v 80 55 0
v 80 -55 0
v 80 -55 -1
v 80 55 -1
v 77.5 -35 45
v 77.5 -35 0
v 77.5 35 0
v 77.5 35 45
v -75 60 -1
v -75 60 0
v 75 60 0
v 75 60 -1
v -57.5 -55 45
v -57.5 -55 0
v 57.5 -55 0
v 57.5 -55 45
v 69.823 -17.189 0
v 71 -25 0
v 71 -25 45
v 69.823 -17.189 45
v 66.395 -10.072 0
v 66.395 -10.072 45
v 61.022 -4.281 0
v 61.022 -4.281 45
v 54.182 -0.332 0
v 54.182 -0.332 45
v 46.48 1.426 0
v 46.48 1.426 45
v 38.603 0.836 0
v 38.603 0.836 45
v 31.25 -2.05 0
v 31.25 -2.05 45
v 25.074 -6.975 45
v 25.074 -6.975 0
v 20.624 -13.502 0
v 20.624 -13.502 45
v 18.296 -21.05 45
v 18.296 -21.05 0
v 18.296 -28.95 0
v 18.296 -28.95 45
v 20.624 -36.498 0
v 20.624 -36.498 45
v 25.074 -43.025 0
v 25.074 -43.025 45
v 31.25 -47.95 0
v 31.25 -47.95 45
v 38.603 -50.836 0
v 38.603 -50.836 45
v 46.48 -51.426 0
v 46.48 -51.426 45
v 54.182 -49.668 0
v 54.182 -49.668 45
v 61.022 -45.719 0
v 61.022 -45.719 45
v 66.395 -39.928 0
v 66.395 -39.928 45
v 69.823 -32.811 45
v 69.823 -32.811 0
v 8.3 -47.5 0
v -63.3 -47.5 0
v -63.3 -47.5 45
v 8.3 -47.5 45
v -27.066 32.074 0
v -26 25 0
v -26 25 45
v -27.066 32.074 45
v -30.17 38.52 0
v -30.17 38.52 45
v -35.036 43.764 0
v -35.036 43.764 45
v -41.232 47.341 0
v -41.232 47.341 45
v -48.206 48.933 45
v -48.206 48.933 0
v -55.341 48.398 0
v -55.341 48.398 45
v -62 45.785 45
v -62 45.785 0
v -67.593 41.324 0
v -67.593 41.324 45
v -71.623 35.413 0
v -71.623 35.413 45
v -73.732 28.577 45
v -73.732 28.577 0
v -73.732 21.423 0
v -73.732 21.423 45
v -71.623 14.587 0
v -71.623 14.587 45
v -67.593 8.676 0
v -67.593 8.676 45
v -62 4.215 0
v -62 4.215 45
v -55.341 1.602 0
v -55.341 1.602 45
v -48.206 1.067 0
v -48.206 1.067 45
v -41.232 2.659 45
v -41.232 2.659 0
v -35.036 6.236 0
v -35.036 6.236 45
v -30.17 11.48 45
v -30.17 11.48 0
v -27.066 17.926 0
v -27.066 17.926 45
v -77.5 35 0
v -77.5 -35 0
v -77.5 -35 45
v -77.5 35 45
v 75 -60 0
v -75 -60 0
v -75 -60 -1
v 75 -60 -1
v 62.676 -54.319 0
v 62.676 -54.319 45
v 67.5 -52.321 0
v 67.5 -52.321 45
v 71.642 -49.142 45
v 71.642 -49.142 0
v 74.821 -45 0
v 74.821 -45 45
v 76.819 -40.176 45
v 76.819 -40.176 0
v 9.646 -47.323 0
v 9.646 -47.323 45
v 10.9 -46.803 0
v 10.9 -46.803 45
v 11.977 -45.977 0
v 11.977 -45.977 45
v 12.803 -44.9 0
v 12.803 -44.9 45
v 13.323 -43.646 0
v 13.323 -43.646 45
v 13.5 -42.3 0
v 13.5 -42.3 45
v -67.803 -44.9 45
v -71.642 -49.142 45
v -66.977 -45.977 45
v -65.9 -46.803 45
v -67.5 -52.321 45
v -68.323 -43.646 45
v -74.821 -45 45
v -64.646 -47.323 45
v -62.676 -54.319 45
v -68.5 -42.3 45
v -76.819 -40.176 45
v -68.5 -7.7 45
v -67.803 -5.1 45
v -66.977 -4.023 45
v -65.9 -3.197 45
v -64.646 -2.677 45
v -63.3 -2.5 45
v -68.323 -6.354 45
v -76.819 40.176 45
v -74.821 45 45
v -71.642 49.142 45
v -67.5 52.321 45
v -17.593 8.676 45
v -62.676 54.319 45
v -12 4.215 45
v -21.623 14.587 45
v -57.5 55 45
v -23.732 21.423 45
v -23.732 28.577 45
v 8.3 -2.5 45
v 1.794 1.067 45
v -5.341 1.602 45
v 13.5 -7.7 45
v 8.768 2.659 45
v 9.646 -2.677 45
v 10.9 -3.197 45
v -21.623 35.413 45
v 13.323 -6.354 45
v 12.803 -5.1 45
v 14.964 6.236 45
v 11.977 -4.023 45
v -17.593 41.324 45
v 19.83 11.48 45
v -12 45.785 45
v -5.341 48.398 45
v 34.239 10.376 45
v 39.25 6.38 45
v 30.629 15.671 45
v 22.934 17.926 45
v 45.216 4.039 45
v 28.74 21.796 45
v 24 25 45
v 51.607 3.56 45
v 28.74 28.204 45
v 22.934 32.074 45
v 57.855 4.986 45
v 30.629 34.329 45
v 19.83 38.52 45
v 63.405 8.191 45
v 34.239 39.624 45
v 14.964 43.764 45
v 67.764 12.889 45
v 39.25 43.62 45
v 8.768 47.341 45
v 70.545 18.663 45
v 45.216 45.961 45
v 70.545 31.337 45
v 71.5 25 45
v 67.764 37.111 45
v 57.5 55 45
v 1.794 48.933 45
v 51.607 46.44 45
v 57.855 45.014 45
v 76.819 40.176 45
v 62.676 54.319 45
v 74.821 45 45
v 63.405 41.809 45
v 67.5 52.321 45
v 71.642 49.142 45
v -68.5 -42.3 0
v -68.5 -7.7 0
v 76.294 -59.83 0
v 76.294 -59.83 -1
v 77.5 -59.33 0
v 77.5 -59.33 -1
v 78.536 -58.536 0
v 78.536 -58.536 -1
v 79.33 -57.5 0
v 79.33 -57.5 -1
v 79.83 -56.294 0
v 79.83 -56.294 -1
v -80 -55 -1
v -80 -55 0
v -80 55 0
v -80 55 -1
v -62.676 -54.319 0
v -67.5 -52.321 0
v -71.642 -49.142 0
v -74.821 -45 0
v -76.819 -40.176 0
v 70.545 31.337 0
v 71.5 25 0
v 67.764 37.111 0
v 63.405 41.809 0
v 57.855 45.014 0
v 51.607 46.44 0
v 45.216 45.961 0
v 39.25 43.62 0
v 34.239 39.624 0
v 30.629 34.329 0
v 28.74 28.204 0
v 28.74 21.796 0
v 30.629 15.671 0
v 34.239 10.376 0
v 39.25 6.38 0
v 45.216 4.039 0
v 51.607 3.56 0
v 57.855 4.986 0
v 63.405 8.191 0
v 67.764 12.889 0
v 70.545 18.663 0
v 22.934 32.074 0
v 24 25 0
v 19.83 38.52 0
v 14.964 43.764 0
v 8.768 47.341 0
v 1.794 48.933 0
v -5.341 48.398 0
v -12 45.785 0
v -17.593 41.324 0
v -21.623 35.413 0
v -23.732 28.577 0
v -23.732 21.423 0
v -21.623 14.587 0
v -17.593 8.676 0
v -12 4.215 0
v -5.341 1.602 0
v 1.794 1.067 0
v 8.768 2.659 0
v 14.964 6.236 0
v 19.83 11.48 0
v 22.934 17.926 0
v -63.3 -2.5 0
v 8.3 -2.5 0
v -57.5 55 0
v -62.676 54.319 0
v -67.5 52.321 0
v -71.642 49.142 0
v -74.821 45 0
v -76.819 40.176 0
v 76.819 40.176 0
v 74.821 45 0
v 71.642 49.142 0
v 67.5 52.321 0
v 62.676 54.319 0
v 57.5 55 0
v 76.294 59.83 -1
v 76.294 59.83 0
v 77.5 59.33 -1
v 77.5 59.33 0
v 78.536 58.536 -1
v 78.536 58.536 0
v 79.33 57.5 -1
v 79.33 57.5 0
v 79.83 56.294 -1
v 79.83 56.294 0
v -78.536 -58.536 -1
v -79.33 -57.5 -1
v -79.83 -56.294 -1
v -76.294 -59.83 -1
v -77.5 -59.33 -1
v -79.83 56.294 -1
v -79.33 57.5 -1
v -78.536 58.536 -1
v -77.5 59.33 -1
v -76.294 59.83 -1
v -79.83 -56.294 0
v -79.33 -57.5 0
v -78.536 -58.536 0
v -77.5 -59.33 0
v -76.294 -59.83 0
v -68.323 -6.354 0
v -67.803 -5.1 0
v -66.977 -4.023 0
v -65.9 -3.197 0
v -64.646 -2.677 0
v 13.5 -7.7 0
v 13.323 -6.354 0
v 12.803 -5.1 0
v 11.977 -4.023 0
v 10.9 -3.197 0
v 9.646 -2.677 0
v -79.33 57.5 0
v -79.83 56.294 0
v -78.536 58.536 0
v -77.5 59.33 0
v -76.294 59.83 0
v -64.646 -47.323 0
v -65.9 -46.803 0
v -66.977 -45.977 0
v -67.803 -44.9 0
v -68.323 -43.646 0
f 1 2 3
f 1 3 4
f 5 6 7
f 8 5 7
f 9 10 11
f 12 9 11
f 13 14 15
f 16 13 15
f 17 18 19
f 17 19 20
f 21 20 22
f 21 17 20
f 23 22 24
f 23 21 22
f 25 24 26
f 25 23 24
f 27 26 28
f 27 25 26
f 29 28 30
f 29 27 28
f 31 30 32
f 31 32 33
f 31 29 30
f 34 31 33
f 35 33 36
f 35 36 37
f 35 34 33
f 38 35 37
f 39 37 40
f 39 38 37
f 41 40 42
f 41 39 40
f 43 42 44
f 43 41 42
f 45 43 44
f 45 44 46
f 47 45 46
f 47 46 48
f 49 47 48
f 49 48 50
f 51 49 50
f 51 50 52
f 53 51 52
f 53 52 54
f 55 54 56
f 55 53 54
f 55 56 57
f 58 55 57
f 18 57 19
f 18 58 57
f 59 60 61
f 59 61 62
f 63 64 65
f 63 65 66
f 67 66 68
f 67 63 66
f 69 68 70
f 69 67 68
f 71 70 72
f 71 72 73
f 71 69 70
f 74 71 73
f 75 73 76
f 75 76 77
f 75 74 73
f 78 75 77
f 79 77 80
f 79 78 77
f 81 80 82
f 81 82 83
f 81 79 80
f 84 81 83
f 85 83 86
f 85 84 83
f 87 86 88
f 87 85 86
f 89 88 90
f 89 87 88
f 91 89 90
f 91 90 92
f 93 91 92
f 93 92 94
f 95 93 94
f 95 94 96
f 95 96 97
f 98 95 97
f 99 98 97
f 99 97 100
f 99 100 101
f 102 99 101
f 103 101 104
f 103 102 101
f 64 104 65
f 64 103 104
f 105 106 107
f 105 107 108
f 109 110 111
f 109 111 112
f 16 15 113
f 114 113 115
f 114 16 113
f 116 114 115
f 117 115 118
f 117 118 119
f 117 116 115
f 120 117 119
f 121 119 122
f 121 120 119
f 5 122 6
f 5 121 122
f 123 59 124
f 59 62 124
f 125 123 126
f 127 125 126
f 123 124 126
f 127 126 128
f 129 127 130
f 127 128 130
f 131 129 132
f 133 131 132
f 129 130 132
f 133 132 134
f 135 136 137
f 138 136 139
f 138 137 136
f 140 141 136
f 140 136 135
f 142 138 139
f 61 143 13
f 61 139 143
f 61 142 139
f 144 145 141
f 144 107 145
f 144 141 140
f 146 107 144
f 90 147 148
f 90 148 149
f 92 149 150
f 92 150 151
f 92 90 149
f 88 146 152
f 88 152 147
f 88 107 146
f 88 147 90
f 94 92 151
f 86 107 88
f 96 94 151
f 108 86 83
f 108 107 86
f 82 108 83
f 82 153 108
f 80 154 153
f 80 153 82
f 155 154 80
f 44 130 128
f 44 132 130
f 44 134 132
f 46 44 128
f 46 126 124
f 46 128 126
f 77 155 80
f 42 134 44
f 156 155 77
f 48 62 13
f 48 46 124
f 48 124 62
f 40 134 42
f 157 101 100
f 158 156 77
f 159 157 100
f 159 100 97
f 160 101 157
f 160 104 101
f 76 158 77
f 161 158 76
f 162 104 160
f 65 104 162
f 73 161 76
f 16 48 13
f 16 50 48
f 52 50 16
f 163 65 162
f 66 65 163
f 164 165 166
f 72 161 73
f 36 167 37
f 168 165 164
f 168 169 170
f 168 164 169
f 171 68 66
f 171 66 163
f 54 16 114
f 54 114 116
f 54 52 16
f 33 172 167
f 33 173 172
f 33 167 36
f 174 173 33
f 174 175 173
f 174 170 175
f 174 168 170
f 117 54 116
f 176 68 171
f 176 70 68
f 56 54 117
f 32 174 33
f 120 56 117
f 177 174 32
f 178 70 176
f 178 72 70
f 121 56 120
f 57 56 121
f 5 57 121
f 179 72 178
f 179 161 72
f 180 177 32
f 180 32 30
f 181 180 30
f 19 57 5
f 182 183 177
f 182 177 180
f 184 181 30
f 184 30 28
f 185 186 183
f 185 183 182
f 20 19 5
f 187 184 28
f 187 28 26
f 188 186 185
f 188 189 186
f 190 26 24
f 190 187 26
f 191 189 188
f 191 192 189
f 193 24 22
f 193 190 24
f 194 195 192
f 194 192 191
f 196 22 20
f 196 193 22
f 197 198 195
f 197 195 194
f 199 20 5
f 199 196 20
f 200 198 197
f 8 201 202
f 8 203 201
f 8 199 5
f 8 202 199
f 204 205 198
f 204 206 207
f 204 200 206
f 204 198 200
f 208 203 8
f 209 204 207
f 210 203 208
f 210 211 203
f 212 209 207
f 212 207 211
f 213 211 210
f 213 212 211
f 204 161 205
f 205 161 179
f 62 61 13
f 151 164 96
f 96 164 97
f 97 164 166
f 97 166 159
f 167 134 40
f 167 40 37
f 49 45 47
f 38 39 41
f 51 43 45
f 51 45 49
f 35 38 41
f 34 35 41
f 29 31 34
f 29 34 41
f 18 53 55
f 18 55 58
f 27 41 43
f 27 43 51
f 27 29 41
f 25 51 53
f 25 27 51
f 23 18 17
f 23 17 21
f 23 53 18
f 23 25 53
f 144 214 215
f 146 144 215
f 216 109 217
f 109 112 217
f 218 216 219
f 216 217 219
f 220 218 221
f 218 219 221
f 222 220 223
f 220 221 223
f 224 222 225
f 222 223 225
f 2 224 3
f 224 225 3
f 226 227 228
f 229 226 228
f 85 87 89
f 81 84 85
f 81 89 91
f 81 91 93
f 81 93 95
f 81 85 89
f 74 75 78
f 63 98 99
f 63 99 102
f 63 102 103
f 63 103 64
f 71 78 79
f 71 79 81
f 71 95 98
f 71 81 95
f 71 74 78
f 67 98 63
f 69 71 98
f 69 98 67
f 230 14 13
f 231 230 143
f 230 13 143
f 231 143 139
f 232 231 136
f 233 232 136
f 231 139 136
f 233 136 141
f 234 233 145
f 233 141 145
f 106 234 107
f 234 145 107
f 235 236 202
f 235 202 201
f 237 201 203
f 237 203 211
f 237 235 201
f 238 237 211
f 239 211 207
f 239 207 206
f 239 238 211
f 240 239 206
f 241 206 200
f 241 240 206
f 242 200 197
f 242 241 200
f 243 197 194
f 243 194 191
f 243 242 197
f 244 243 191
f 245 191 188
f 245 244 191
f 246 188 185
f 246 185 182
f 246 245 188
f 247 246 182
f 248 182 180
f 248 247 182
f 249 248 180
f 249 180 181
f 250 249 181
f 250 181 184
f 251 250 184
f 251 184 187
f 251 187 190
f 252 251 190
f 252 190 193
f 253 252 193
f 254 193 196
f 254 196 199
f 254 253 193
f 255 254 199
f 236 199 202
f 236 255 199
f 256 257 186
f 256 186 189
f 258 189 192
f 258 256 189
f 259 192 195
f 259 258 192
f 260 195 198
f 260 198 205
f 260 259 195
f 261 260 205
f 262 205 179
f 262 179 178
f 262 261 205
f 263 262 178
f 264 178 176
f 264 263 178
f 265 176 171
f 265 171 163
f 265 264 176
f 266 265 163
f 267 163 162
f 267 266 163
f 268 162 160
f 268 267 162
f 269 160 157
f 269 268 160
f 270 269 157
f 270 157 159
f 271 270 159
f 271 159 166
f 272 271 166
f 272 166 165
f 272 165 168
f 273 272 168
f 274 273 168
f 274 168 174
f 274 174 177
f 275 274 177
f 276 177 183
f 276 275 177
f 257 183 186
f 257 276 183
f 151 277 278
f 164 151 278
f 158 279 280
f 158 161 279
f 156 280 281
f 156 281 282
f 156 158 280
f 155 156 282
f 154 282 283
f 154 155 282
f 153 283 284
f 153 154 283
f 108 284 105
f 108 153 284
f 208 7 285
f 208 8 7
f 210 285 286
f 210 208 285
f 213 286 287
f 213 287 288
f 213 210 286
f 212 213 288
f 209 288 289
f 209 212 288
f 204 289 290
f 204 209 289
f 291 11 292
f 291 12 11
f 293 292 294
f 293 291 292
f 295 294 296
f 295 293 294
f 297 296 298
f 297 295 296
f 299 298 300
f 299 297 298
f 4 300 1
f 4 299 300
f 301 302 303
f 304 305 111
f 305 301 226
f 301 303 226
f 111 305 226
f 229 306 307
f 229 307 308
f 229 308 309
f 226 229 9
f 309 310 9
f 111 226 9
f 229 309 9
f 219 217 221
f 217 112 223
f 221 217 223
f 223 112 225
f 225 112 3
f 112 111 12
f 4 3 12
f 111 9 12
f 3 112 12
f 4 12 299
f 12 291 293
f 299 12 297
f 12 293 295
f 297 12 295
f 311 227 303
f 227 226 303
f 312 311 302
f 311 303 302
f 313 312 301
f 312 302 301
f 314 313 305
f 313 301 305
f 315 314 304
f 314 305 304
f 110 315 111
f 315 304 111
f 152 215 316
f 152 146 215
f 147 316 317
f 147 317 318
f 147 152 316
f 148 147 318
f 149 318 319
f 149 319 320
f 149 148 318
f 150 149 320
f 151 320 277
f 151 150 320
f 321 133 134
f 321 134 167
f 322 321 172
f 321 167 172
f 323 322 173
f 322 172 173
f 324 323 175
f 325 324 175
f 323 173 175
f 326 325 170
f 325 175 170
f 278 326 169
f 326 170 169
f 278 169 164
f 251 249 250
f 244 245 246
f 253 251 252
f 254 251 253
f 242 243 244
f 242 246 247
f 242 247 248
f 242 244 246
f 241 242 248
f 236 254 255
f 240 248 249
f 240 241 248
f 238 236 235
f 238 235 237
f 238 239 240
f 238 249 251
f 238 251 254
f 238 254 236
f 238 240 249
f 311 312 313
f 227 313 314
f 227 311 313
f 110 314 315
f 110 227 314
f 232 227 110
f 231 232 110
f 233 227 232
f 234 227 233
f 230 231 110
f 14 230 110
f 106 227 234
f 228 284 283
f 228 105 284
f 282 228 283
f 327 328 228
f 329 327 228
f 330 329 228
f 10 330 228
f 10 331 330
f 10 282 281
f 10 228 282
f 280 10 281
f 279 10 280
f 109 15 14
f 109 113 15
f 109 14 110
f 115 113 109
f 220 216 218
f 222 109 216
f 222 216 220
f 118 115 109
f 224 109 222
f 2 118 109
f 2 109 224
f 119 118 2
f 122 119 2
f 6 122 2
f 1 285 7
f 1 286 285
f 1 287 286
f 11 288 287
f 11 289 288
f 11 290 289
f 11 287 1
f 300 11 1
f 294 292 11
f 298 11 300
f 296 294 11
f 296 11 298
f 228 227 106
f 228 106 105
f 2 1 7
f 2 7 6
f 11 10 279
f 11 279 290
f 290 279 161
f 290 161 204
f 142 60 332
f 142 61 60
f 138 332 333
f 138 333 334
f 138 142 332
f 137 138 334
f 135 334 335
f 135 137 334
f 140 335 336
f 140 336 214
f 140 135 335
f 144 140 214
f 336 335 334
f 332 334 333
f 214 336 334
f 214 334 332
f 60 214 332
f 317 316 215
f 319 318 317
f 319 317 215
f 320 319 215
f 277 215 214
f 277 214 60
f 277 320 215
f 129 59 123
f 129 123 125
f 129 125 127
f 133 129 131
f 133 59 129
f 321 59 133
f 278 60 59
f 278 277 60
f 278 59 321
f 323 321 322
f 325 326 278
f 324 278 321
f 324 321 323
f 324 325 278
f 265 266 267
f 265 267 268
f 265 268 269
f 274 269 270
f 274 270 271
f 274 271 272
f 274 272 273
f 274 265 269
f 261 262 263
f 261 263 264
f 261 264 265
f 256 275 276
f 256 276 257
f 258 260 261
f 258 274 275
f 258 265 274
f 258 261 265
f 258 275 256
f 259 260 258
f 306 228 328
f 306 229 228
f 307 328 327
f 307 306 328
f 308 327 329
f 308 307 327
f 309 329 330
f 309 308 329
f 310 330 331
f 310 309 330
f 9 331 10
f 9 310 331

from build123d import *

# Parameters (mm, degrees)
F0_W     = 155
F0_H     = 110
F0_W_2   = 82
F0_H_2   = 45
F0_R     = 26.5
F0_R_2   = 24
F0_R_3   = 21.5
F1_DEPTH = 45
F2_W     = 160
F2_H     = 120
F2_W_2   = 155
F2_H_2   = 110
F3_DEPTH = 1
F4_R     = 5
F5_R     = 20
F6_R     = 5.2


with BuildPart() as f1:
    # F0 (on Top) → F1 (new body)
    with BuildSketch(Plane.XY):
        Rectangle(F0_W, F0_H)
        with Locations((-27.5, -25)):
            Rectangle(F0_W_2, F0_H_2, mode=Mode.SUBTRACT)
        with Locations((44.5, -25)):
            Circle(F0_R, mode=Mode.SUBTRACT)
        with Locations((-50, 25)):
            Circle(F0_R_2, mode=Mode.SUBTRACT)
        with Locations((0, 25)):
            Circle(F0_R_2, mode=Mode.SUBTRACT)
        with Locations((50, 25)):
            Circle(F0_R_3, mode=Mode.SUBTRACT)
    extrude(amount=F1_DEPTH)

    # F2 (on face) + F0 (on Top) → F3 (join)
    with BuildSketch(Plane.XY):
        Rectangle(F2_W, F2_H)
        Rectangle(F2_W_2, F2_H_2, mode=Mode.SUBTRACT)
    with BuildSketch(Plane.XY):
        Rectangle(F0_W, F0_H)
        with Locations((-27.5, -25)):
            Rectangle(F0_W_2, F0_H_2, mode=Mode.SUBTRACT)
        with Locations((44.5, -25)):
            Circle(F0_R, mode=Mode.SUBTRACT)
        with Locations((-50, 25)):
            Circle(F0_R_2, mode=Mode.SUBTRACT)
        with Locations((0, 25)):
            Circle(F0_R_2, mode=Mode.SUBTRACT)
        with Locations((50, 25)):
            Circle(F0_R_3, mode=Mode.SUBTRACT)
        with Locations((-27.5, -25)):
            Rectangle(F0_W_2, F0_H_2)
        with Locations((44.5, -25)):
            Circle(F0_R)
        with Locations((0, 25)):
            Circle(F0_R_2)
        with Locations((-50, 25)):
            Circle(F0_R_2)
        with Locations((50, 25)):
            Circle(F0_R_3)
    extrude(amount=-F3_DEPTH)

    # F4
    f4_edges = [f1.edges().sort_by_distance(p)[0] for p in [
        (-80, -60, -0.5),
        (-80, 60, -0.5),
        (80, 60, -0.5),
        (80, -60, -0.5),
    ]]
    fillet(f4_edges, radius=F4_R)

    # F5
    f5_edges = [f1.edges().sort_by_distance(p)[0] for p in [
        (77.5, -55, 22.5),
        (-77.5, -55, 22.5),
        (-77.5, 55, 22.5),
        (77.5, 55, 22.5),
    ]]
    fillet(f5_edges, radius=F5_R)

    # F6
    f6_edges = [f1.edges().sort_by_distance(p)[0] for p in [
        (-68.5, -47.5, 22.5),
        (-68.5, -2.5, 22.5),
        (13.5, -2.5, 22.5),
        (13.5, -47.5, 22.5),
    ]]
    fillet(f6_edges, radius=F6_R)


solid = f1.part
